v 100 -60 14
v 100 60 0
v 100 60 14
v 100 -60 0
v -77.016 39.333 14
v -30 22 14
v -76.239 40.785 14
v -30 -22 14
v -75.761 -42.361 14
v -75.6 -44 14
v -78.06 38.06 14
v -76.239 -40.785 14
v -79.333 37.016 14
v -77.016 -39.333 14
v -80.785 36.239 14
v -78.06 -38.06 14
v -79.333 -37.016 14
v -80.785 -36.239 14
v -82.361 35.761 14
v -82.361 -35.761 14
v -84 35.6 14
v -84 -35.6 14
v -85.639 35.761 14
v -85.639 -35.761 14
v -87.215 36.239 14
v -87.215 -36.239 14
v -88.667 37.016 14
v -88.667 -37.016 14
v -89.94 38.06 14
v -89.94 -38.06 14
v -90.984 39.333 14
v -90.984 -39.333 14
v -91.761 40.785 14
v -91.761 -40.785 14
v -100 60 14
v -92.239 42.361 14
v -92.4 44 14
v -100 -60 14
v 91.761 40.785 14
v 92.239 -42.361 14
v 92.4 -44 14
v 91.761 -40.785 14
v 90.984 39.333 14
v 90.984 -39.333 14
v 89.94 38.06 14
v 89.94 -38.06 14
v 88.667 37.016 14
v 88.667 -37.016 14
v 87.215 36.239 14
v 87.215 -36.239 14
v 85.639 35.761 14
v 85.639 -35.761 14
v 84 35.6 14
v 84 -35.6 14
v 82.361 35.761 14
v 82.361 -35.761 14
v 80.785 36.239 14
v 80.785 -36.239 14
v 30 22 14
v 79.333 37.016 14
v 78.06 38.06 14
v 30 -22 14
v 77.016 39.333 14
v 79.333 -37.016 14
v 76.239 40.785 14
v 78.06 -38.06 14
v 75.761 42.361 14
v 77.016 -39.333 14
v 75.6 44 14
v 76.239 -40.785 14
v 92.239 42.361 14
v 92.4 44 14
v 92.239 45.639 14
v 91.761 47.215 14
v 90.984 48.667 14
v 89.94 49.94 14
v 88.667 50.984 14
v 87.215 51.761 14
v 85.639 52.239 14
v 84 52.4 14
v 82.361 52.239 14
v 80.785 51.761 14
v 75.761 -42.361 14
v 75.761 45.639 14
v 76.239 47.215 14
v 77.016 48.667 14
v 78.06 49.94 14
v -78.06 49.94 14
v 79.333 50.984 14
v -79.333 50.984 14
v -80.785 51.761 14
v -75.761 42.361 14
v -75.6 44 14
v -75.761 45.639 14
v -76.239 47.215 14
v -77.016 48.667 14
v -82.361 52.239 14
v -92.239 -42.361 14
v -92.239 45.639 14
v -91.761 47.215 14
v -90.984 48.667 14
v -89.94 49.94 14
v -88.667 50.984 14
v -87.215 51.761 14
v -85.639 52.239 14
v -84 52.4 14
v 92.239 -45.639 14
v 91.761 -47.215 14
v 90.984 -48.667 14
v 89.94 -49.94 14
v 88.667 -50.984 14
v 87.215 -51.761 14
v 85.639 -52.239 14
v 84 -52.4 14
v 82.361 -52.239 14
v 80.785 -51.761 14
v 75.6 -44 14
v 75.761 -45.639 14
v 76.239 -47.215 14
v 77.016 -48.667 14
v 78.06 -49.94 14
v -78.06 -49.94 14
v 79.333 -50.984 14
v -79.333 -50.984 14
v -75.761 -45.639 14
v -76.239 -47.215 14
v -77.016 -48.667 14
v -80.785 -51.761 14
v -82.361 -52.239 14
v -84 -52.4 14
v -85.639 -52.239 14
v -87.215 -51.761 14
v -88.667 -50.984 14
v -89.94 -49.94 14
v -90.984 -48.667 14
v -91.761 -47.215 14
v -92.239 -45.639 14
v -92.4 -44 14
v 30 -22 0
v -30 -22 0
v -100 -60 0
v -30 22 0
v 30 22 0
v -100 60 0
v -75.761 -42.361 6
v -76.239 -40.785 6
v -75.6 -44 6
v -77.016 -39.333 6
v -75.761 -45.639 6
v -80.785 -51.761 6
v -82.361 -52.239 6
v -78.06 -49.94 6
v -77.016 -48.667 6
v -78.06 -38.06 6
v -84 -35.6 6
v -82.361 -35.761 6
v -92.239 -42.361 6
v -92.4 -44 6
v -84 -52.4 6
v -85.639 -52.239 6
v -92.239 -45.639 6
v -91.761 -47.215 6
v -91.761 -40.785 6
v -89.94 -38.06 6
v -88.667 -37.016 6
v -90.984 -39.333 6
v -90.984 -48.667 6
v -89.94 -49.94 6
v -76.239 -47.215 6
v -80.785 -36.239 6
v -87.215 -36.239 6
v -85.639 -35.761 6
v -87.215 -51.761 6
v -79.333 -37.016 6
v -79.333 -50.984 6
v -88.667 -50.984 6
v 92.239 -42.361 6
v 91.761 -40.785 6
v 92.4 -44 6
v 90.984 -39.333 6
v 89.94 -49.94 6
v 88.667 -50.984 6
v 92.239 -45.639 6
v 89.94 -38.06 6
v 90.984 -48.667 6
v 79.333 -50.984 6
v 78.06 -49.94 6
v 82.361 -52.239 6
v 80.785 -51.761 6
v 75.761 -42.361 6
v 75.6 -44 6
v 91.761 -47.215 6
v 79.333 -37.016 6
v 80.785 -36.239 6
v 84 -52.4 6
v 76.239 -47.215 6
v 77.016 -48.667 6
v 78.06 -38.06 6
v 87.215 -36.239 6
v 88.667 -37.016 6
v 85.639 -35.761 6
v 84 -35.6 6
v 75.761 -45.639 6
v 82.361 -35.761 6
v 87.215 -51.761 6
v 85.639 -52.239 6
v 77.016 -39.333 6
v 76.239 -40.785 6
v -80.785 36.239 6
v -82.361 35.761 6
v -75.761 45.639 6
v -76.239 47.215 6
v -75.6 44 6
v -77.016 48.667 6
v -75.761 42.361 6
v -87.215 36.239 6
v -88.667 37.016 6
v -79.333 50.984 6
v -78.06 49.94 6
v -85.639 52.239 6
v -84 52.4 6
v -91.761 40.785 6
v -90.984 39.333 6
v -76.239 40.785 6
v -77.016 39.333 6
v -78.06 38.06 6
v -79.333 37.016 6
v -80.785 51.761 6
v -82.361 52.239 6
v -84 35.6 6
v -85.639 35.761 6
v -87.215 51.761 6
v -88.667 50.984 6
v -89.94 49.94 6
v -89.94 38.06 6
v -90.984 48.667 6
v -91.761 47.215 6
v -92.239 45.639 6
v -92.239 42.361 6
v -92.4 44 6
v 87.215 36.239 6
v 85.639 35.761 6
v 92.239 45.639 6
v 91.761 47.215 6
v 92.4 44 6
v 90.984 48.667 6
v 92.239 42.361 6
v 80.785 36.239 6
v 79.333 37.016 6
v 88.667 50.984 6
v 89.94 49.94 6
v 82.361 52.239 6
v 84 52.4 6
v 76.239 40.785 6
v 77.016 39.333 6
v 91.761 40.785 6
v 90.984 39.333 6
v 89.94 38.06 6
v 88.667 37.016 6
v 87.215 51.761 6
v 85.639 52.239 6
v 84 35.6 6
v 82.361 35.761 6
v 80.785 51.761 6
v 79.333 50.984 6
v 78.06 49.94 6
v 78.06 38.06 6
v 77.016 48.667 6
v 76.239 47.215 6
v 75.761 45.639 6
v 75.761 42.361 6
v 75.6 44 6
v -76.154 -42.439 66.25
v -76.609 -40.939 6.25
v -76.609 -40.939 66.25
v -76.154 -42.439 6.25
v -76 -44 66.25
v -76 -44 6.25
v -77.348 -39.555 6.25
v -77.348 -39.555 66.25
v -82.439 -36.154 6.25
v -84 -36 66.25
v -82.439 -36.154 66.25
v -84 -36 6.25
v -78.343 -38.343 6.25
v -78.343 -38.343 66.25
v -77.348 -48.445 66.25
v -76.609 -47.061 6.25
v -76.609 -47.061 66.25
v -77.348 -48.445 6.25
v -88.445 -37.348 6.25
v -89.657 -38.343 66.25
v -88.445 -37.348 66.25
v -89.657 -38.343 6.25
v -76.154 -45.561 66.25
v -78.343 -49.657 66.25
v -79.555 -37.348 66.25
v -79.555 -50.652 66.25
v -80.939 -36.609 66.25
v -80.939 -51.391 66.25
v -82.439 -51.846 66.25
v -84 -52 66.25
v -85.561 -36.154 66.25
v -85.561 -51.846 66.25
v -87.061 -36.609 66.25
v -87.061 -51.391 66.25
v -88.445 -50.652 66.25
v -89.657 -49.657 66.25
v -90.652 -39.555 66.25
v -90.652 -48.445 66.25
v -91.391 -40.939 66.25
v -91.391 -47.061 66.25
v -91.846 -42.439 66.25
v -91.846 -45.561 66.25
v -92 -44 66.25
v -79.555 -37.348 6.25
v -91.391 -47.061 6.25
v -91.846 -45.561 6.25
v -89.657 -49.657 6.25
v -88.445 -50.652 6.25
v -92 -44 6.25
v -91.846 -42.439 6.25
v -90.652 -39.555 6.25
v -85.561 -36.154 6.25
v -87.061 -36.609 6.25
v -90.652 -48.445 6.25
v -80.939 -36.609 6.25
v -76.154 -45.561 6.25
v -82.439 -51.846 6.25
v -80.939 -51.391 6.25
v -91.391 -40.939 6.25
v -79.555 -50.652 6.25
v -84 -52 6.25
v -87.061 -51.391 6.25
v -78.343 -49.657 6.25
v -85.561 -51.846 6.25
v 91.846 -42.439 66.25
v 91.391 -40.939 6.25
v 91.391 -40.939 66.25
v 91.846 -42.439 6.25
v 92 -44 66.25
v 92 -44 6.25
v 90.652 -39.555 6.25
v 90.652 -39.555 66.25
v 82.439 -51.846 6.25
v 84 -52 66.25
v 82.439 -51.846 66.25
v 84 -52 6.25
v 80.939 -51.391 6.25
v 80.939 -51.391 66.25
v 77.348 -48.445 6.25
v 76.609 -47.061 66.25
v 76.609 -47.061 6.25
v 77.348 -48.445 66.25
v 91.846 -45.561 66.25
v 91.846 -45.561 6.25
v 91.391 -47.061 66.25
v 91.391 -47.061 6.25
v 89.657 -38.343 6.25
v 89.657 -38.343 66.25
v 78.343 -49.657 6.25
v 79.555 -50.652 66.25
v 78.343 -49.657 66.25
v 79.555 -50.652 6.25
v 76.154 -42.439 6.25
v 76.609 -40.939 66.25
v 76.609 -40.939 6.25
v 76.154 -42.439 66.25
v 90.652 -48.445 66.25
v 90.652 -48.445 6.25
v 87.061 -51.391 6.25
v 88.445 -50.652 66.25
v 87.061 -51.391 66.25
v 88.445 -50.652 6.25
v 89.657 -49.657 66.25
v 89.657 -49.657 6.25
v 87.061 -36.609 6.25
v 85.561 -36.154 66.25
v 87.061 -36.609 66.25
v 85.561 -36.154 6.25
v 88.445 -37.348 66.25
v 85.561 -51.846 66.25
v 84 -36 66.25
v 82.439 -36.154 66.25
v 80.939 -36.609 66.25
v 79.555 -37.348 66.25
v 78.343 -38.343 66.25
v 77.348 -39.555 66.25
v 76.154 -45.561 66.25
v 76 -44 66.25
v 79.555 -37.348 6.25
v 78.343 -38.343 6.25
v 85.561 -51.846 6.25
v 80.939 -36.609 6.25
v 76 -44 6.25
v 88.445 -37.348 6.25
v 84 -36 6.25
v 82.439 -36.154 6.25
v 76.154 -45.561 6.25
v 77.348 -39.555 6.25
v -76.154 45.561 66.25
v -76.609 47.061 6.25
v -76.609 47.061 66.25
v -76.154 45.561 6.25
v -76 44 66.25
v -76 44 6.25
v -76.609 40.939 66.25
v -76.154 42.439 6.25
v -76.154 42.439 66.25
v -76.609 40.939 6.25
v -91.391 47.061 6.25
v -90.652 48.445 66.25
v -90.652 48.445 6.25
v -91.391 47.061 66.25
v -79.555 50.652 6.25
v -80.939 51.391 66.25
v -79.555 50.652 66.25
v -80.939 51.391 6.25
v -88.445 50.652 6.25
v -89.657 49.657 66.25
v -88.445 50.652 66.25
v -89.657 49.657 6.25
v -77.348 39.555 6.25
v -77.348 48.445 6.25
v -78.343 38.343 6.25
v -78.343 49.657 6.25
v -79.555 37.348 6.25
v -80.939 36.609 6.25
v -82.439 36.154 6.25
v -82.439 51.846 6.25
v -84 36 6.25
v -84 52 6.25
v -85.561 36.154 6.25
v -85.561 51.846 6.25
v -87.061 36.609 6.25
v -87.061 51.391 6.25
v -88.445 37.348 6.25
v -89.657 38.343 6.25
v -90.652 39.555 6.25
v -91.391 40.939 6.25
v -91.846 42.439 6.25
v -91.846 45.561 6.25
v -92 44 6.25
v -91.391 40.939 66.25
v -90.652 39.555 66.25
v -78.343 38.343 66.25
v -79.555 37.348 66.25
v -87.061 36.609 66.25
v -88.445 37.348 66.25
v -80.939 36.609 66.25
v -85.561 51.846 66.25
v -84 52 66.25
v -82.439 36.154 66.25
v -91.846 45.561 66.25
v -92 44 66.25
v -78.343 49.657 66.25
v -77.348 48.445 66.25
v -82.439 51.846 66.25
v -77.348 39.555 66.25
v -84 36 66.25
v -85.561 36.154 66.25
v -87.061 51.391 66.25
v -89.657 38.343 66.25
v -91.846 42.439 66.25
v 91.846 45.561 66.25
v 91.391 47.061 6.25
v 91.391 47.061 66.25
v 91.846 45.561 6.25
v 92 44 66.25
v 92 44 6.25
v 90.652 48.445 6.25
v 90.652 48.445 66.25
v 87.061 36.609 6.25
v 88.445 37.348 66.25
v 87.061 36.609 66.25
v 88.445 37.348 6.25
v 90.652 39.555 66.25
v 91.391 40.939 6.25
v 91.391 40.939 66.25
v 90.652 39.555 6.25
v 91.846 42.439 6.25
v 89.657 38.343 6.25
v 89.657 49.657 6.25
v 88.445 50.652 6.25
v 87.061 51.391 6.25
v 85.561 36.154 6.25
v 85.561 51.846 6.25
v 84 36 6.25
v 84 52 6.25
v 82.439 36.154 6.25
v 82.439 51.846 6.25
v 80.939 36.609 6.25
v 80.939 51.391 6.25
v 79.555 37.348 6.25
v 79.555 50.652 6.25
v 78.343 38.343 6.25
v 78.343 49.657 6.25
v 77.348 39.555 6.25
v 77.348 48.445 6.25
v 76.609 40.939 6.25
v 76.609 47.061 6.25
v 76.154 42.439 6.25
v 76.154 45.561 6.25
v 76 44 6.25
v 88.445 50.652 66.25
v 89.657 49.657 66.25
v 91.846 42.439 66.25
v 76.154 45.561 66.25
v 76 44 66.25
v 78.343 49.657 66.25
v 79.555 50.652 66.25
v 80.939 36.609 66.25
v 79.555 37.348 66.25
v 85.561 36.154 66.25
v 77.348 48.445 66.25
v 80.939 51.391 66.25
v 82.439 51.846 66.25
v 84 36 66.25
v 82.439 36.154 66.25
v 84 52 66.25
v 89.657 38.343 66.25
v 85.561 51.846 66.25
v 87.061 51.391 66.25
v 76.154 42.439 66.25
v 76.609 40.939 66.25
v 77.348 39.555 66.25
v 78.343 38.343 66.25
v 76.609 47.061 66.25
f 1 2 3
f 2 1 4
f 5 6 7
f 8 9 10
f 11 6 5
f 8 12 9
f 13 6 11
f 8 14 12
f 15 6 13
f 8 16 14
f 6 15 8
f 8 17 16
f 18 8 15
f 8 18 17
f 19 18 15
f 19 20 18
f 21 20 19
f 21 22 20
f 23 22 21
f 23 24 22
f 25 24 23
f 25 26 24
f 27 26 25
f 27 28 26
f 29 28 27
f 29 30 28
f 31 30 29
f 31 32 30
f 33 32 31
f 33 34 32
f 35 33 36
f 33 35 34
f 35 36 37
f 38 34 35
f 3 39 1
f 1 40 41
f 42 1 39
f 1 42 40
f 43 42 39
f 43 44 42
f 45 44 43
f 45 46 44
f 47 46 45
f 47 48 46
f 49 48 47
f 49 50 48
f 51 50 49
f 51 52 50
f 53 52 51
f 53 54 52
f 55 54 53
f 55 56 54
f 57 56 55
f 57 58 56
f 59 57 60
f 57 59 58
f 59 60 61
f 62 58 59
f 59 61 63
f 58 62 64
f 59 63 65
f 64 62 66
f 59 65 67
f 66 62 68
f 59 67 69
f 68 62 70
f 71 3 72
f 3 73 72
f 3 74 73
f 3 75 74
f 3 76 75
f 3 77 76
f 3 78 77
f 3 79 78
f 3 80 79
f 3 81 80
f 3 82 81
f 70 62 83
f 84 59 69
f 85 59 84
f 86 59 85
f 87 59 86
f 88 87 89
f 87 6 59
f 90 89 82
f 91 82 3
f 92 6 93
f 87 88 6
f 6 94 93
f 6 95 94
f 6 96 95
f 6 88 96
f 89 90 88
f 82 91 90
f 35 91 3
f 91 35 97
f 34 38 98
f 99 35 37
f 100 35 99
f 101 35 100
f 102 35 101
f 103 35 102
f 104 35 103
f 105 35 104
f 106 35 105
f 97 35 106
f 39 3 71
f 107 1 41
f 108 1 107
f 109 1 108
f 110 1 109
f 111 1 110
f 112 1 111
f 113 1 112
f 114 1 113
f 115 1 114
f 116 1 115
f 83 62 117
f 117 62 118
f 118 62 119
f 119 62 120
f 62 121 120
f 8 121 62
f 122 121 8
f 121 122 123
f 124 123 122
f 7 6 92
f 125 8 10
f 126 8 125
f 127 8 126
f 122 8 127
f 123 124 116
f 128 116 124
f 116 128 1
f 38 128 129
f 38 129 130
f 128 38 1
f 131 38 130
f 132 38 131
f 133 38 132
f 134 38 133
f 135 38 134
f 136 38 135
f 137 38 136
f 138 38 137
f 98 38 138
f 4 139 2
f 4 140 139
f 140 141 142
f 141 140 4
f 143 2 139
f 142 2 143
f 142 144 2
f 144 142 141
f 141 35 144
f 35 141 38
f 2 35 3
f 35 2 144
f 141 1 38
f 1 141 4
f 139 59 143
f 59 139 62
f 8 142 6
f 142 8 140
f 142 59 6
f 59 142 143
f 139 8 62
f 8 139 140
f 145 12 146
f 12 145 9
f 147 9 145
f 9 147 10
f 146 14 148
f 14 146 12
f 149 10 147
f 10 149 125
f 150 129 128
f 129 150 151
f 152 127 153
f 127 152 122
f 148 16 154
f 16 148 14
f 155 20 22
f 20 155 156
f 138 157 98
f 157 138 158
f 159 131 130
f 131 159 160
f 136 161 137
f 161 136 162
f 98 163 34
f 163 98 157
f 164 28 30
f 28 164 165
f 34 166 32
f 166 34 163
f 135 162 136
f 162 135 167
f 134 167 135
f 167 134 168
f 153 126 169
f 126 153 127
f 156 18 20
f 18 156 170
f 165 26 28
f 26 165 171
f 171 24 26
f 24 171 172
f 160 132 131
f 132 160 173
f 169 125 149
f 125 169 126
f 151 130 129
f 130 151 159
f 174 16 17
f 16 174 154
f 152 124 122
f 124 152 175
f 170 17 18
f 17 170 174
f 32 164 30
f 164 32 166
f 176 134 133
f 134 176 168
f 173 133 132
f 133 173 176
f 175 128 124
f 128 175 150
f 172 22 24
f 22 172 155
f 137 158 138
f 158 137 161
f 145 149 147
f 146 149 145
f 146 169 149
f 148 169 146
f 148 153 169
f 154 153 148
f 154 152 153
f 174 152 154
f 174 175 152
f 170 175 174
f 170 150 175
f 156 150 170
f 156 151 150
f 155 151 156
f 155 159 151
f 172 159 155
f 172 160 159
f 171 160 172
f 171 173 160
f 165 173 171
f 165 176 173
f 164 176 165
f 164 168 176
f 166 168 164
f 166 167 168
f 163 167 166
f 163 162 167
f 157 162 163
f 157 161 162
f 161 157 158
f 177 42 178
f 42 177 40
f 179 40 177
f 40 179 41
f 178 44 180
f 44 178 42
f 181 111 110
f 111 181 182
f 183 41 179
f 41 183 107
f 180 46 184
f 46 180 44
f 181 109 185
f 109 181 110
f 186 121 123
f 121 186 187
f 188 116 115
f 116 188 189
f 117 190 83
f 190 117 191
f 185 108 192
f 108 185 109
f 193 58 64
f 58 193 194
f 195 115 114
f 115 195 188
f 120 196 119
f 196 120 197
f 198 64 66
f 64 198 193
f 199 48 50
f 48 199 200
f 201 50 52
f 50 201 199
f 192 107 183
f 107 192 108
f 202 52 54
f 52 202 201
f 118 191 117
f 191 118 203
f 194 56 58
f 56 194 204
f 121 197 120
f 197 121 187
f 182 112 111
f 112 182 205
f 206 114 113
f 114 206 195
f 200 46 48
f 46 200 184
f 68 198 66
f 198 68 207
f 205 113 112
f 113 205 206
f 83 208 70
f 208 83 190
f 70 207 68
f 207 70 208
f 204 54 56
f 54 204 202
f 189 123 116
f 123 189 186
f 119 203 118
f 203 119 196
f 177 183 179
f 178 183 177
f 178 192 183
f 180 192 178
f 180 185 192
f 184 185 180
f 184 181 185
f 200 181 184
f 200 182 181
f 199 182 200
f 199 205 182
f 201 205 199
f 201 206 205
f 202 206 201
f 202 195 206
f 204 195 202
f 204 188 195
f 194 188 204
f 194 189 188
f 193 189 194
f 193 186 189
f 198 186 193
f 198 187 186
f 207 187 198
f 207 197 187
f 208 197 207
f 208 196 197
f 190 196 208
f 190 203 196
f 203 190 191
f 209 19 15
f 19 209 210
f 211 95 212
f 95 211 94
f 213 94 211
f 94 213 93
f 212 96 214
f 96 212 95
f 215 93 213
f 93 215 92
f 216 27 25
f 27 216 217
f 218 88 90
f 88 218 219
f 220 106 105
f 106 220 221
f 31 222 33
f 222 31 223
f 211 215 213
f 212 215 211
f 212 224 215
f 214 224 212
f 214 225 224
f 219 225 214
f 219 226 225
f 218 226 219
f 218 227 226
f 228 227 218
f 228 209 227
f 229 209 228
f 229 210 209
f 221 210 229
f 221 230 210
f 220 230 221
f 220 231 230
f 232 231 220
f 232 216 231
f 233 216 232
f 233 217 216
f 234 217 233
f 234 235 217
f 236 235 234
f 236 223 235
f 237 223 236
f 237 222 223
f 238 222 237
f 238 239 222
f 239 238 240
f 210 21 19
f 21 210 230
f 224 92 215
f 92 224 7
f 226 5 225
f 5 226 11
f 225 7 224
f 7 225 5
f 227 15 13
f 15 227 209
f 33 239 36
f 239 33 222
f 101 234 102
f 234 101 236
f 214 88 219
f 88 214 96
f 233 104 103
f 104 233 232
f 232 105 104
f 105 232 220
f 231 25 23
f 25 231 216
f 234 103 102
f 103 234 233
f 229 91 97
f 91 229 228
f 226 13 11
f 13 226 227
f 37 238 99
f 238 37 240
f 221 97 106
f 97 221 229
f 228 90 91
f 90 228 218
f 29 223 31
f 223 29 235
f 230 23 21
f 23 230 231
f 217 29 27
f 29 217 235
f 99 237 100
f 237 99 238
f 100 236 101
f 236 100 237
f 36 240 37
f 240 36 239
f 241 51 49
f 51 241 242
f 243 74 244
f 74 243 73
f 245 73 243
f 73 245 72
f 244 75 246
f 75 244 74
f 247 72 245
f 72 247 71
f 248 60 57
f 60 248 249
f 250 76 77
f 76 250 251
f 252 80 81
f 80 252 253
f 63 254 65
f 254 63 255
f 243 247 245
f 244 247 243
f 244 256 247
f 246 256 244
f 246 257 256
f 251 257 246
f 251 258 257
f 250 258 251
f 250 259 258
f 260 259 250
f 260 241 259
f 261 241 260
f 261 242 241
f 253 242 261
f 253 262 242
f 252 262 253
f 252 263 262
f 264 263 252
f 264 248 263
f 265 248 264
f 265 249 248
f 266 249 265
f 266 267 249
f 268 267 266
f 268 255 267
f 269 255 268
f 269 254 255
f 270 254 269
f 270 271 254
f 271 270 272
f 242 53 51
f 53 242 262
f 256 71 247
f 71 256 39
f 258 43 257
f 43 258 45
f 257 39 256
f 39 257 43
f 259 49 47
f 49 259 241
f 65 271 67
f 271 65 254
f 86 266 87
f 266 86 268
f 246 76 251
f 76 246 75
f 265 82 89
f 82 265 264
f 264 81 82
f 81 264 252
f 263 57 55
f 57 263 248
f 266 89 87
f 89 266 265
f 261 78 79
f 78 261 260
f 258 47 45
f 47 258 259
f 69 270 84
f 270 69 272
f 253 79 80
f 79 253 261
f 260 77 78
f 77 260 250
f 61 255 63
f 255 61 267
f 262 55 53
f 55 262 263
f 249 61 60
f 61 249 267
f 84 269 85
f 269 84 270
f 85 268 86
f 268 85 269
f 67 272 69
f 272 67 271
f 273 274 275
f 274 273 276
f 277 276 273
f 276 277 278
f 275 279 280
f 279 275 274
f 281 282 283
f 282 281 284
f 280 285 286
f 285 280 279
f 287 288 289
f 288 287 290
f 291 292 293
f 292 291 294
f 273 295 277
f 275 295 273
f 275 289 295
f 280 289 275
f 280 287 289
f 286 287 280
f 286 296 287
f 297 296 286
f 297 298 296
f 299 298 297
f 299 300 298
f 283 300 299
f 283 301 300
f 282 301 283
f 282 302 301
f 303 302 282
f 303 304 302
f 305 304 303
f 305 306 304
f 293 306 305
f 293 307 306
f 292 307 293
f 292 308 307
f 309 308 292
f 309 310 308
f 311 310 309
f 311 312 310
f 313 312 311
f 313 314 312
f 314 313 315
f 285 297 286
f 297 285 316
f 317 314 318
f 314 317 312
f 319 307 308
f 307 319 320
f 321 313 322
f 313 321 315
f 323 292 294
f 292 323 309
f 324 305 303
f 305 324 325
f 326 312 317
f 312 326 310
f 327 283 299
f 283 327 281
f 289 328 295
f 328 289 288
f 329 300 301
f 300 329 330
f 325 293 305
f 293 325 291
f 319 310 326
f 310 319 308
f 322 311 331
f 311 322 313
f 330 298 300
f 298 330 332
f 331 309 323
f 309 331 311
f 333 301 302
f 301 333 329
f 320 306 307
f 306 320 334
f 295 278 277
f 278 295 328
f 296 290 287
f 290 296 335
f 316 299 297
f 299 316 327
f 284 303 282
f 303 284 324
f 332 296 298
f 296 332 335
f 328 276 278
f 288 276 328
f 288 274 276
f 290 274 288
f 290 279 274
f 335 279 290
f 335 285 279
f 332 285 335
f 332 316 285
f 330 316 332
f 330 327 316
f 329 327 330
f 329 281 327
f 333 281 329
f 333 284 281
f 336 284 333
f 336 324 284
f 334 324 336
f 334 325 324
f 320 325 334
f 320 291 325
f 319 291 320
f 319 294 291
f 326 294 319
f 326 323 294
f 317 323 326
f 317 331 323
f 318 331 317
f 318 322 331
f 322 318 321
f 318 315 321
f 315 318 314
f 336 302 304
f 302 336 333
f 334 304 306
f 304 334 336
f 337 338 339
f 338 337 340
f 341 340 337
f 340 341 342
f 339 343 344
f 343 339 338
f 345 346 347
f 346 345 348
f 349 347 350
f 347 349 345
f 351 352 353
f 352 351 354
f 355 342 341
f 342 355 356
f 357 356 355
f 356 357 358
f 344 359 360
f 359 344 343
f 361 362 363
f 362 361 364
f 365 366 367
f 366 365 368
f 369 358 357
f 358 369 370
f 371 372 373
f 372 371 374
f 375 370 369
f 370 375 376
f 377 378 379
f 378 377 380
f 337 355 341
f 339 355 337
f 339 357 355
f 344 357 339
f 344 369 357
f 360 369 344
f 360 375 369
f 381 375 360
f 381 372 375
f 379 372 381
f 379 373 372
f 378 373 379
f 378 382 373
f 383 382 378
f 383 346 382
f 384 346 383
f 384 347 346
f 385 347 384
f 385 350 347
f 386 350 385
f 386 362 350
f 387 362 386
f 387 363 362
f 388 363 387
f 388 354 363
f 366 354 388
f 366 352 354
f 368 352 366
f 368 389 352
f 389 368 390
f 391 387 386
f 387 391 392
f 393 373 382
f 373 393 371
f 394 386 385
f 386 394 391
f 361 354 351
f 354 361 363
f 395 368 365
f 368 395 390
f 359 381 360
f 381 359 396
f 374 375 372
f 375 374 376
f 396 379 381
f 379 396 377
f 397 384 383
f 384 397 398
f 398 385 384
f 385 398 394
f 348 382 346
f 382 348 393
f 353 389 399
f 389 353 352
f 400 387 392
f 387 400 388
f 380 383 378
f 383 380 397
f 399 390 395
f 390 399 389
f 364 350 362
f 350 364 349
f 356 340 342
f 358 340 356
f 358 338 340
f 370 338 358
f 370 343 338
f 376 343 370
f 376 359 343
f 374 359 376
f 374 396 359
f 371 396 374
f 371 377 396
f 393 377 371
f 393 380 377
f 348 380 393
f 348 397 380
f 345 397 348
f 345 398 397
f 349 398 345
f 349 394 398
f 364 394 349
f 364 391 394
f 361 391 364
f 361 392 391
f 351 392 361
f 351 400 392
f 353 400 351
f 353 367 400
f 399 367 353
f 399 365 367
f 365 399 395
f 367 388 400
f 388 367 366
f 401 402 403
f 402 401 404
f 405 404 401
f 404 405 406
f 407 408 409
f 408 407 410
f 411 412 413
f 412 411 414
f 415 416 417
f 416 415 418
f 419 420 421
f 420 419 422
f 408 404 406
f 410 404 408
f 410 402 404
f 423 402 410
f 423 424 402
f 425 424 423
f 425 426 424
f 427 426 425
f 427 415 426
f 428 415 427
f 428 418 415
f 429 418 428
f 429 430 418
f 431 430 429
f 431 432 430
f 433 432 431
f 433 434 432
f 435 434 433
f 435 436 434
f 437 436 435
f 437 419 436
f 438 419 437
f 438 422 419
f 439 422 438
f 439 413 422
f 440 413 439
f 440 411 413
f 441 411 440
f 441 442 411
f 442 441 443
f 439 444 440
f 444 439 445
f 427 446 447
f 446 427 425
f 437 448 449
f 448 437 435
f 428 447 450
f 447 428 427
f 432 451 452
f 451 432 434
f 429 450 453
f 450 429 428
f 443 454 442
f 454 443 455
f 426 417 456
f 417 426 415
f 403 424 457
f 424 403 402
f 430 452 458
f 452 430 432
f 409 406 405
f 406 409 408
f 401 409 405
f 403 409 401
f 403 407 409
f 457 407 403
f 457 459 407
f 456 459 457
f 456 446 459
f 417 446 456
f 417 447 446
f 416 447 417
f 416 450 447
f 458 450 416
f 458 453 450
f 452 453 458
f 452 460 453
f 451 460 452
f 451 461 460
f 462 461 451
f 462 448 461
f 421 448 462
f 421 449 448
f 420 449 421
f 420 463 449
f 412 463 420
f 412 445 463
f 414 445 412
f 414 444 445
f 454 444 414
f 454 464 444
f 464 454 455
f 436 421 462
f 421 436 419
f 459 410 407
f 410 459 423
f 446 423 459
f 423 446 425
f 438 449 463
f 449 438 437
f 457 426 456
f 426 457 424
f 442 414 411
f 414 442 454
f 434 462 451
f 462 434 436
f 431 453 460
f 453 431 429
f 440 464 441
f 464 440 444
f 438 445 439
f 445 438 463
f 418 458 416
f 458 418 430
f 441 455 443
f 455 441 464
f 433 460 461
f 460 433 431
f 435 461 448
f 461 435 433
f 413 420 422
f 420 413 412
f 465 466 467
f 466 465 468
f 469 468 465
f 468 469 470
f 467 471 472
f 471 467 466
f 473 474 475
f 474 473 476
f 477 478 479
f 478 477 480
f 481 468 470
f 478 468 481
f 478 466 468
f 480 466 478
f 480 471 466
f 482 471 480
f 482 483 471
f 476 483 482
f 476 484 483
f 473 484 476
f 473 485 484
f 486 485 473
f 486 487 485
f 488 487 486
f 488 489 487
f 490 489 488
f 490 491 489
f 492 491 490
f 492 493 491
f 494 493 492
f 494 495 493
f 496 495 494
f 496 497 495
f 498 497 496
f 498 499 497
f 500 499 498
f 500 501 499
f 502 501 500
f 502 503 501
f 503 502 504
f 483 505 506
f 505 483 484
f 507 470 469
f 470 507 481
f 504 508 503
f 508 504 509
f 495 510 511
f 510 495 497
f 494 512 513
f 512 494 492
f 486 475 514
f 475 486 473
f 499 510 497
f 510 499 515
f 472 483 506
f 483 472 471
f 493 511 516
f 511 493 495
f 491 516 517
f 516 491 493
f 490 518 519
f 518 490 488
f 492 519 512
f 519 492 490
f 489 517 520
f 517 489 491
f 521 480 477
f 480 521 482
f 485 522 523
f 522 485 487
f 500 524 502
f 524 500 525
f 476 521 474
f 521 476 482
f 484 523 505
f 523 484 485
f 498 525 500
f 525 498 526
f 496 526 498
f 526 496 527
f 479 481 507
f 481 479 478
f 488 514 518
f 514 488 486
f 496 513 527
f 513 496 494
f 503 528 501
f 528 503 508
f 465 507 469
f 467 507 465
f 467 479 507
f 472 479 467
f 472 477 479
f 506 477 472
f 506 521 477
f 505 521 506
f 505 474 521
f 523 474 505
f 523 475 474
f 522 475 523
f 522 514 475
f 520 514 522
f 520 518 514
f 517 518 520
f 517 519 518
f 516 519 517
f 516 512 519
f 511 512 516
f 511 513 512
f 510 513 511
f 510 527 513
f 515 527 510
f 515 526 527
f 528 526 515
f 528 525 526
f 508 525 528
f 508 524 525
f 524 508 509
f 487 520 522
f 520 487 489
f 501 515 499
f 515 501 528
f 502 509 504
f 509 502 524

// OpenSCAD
$fn = 32;

// ------------------------------------------------------------------------
// Frame with four posts: 200 x 120 mm frame, four d16 posts
// Every part is its own module, assembly() places them once.
// ------------------------------------------------------------------------

// --- part 1 ---
module base_frame() {
  difference() {
    translate([-100, -60, 0]) cube([200, 120, 14]);
    translate([-30, -22, -1]) cube([60, 44, 16]);
    translate([-84, -44, 6]) cylinder(h = 9, d = 16.8);
    translate([84, -44, 6]) cylinder(h = 9, d = 16.8);
    translate([-84, 44, 6]) cylinder(h = 9, d = 16.8);
    translate([84, 44, 6]) cylinder(h = 9, d = 16.8);
  }
}

// --- part 2 ---
module post1() {
  cylinder(h = 60, d = 16);
}

// --- part 3 ---
module post2() {
  cylinder(h = 60, d = 16);
}

// --- part 4 ---
module post3() {
  cylinder(h = 60, d = 16);
}

// --- part 5 ---
module post4() {
  cylinder(h = 60, d = 16);
}

// --- assembly ---
module assembly() {
  translate([0, 0, 0]) rotate([0, 0, 0]) base_frame();
  translate([-84, -44, 6.25]) rotate([0, 0, 0]) post1();
  translate([84, -44, 6.25]) rotate([0, 0, 0]) post2();
  translate([-84, 44, 6.25]) rotate([0, 0, 0]) post3();
  translate([84, 44, 6.25]) rotate([0, 0, 0]) post4();
}

assembly();
